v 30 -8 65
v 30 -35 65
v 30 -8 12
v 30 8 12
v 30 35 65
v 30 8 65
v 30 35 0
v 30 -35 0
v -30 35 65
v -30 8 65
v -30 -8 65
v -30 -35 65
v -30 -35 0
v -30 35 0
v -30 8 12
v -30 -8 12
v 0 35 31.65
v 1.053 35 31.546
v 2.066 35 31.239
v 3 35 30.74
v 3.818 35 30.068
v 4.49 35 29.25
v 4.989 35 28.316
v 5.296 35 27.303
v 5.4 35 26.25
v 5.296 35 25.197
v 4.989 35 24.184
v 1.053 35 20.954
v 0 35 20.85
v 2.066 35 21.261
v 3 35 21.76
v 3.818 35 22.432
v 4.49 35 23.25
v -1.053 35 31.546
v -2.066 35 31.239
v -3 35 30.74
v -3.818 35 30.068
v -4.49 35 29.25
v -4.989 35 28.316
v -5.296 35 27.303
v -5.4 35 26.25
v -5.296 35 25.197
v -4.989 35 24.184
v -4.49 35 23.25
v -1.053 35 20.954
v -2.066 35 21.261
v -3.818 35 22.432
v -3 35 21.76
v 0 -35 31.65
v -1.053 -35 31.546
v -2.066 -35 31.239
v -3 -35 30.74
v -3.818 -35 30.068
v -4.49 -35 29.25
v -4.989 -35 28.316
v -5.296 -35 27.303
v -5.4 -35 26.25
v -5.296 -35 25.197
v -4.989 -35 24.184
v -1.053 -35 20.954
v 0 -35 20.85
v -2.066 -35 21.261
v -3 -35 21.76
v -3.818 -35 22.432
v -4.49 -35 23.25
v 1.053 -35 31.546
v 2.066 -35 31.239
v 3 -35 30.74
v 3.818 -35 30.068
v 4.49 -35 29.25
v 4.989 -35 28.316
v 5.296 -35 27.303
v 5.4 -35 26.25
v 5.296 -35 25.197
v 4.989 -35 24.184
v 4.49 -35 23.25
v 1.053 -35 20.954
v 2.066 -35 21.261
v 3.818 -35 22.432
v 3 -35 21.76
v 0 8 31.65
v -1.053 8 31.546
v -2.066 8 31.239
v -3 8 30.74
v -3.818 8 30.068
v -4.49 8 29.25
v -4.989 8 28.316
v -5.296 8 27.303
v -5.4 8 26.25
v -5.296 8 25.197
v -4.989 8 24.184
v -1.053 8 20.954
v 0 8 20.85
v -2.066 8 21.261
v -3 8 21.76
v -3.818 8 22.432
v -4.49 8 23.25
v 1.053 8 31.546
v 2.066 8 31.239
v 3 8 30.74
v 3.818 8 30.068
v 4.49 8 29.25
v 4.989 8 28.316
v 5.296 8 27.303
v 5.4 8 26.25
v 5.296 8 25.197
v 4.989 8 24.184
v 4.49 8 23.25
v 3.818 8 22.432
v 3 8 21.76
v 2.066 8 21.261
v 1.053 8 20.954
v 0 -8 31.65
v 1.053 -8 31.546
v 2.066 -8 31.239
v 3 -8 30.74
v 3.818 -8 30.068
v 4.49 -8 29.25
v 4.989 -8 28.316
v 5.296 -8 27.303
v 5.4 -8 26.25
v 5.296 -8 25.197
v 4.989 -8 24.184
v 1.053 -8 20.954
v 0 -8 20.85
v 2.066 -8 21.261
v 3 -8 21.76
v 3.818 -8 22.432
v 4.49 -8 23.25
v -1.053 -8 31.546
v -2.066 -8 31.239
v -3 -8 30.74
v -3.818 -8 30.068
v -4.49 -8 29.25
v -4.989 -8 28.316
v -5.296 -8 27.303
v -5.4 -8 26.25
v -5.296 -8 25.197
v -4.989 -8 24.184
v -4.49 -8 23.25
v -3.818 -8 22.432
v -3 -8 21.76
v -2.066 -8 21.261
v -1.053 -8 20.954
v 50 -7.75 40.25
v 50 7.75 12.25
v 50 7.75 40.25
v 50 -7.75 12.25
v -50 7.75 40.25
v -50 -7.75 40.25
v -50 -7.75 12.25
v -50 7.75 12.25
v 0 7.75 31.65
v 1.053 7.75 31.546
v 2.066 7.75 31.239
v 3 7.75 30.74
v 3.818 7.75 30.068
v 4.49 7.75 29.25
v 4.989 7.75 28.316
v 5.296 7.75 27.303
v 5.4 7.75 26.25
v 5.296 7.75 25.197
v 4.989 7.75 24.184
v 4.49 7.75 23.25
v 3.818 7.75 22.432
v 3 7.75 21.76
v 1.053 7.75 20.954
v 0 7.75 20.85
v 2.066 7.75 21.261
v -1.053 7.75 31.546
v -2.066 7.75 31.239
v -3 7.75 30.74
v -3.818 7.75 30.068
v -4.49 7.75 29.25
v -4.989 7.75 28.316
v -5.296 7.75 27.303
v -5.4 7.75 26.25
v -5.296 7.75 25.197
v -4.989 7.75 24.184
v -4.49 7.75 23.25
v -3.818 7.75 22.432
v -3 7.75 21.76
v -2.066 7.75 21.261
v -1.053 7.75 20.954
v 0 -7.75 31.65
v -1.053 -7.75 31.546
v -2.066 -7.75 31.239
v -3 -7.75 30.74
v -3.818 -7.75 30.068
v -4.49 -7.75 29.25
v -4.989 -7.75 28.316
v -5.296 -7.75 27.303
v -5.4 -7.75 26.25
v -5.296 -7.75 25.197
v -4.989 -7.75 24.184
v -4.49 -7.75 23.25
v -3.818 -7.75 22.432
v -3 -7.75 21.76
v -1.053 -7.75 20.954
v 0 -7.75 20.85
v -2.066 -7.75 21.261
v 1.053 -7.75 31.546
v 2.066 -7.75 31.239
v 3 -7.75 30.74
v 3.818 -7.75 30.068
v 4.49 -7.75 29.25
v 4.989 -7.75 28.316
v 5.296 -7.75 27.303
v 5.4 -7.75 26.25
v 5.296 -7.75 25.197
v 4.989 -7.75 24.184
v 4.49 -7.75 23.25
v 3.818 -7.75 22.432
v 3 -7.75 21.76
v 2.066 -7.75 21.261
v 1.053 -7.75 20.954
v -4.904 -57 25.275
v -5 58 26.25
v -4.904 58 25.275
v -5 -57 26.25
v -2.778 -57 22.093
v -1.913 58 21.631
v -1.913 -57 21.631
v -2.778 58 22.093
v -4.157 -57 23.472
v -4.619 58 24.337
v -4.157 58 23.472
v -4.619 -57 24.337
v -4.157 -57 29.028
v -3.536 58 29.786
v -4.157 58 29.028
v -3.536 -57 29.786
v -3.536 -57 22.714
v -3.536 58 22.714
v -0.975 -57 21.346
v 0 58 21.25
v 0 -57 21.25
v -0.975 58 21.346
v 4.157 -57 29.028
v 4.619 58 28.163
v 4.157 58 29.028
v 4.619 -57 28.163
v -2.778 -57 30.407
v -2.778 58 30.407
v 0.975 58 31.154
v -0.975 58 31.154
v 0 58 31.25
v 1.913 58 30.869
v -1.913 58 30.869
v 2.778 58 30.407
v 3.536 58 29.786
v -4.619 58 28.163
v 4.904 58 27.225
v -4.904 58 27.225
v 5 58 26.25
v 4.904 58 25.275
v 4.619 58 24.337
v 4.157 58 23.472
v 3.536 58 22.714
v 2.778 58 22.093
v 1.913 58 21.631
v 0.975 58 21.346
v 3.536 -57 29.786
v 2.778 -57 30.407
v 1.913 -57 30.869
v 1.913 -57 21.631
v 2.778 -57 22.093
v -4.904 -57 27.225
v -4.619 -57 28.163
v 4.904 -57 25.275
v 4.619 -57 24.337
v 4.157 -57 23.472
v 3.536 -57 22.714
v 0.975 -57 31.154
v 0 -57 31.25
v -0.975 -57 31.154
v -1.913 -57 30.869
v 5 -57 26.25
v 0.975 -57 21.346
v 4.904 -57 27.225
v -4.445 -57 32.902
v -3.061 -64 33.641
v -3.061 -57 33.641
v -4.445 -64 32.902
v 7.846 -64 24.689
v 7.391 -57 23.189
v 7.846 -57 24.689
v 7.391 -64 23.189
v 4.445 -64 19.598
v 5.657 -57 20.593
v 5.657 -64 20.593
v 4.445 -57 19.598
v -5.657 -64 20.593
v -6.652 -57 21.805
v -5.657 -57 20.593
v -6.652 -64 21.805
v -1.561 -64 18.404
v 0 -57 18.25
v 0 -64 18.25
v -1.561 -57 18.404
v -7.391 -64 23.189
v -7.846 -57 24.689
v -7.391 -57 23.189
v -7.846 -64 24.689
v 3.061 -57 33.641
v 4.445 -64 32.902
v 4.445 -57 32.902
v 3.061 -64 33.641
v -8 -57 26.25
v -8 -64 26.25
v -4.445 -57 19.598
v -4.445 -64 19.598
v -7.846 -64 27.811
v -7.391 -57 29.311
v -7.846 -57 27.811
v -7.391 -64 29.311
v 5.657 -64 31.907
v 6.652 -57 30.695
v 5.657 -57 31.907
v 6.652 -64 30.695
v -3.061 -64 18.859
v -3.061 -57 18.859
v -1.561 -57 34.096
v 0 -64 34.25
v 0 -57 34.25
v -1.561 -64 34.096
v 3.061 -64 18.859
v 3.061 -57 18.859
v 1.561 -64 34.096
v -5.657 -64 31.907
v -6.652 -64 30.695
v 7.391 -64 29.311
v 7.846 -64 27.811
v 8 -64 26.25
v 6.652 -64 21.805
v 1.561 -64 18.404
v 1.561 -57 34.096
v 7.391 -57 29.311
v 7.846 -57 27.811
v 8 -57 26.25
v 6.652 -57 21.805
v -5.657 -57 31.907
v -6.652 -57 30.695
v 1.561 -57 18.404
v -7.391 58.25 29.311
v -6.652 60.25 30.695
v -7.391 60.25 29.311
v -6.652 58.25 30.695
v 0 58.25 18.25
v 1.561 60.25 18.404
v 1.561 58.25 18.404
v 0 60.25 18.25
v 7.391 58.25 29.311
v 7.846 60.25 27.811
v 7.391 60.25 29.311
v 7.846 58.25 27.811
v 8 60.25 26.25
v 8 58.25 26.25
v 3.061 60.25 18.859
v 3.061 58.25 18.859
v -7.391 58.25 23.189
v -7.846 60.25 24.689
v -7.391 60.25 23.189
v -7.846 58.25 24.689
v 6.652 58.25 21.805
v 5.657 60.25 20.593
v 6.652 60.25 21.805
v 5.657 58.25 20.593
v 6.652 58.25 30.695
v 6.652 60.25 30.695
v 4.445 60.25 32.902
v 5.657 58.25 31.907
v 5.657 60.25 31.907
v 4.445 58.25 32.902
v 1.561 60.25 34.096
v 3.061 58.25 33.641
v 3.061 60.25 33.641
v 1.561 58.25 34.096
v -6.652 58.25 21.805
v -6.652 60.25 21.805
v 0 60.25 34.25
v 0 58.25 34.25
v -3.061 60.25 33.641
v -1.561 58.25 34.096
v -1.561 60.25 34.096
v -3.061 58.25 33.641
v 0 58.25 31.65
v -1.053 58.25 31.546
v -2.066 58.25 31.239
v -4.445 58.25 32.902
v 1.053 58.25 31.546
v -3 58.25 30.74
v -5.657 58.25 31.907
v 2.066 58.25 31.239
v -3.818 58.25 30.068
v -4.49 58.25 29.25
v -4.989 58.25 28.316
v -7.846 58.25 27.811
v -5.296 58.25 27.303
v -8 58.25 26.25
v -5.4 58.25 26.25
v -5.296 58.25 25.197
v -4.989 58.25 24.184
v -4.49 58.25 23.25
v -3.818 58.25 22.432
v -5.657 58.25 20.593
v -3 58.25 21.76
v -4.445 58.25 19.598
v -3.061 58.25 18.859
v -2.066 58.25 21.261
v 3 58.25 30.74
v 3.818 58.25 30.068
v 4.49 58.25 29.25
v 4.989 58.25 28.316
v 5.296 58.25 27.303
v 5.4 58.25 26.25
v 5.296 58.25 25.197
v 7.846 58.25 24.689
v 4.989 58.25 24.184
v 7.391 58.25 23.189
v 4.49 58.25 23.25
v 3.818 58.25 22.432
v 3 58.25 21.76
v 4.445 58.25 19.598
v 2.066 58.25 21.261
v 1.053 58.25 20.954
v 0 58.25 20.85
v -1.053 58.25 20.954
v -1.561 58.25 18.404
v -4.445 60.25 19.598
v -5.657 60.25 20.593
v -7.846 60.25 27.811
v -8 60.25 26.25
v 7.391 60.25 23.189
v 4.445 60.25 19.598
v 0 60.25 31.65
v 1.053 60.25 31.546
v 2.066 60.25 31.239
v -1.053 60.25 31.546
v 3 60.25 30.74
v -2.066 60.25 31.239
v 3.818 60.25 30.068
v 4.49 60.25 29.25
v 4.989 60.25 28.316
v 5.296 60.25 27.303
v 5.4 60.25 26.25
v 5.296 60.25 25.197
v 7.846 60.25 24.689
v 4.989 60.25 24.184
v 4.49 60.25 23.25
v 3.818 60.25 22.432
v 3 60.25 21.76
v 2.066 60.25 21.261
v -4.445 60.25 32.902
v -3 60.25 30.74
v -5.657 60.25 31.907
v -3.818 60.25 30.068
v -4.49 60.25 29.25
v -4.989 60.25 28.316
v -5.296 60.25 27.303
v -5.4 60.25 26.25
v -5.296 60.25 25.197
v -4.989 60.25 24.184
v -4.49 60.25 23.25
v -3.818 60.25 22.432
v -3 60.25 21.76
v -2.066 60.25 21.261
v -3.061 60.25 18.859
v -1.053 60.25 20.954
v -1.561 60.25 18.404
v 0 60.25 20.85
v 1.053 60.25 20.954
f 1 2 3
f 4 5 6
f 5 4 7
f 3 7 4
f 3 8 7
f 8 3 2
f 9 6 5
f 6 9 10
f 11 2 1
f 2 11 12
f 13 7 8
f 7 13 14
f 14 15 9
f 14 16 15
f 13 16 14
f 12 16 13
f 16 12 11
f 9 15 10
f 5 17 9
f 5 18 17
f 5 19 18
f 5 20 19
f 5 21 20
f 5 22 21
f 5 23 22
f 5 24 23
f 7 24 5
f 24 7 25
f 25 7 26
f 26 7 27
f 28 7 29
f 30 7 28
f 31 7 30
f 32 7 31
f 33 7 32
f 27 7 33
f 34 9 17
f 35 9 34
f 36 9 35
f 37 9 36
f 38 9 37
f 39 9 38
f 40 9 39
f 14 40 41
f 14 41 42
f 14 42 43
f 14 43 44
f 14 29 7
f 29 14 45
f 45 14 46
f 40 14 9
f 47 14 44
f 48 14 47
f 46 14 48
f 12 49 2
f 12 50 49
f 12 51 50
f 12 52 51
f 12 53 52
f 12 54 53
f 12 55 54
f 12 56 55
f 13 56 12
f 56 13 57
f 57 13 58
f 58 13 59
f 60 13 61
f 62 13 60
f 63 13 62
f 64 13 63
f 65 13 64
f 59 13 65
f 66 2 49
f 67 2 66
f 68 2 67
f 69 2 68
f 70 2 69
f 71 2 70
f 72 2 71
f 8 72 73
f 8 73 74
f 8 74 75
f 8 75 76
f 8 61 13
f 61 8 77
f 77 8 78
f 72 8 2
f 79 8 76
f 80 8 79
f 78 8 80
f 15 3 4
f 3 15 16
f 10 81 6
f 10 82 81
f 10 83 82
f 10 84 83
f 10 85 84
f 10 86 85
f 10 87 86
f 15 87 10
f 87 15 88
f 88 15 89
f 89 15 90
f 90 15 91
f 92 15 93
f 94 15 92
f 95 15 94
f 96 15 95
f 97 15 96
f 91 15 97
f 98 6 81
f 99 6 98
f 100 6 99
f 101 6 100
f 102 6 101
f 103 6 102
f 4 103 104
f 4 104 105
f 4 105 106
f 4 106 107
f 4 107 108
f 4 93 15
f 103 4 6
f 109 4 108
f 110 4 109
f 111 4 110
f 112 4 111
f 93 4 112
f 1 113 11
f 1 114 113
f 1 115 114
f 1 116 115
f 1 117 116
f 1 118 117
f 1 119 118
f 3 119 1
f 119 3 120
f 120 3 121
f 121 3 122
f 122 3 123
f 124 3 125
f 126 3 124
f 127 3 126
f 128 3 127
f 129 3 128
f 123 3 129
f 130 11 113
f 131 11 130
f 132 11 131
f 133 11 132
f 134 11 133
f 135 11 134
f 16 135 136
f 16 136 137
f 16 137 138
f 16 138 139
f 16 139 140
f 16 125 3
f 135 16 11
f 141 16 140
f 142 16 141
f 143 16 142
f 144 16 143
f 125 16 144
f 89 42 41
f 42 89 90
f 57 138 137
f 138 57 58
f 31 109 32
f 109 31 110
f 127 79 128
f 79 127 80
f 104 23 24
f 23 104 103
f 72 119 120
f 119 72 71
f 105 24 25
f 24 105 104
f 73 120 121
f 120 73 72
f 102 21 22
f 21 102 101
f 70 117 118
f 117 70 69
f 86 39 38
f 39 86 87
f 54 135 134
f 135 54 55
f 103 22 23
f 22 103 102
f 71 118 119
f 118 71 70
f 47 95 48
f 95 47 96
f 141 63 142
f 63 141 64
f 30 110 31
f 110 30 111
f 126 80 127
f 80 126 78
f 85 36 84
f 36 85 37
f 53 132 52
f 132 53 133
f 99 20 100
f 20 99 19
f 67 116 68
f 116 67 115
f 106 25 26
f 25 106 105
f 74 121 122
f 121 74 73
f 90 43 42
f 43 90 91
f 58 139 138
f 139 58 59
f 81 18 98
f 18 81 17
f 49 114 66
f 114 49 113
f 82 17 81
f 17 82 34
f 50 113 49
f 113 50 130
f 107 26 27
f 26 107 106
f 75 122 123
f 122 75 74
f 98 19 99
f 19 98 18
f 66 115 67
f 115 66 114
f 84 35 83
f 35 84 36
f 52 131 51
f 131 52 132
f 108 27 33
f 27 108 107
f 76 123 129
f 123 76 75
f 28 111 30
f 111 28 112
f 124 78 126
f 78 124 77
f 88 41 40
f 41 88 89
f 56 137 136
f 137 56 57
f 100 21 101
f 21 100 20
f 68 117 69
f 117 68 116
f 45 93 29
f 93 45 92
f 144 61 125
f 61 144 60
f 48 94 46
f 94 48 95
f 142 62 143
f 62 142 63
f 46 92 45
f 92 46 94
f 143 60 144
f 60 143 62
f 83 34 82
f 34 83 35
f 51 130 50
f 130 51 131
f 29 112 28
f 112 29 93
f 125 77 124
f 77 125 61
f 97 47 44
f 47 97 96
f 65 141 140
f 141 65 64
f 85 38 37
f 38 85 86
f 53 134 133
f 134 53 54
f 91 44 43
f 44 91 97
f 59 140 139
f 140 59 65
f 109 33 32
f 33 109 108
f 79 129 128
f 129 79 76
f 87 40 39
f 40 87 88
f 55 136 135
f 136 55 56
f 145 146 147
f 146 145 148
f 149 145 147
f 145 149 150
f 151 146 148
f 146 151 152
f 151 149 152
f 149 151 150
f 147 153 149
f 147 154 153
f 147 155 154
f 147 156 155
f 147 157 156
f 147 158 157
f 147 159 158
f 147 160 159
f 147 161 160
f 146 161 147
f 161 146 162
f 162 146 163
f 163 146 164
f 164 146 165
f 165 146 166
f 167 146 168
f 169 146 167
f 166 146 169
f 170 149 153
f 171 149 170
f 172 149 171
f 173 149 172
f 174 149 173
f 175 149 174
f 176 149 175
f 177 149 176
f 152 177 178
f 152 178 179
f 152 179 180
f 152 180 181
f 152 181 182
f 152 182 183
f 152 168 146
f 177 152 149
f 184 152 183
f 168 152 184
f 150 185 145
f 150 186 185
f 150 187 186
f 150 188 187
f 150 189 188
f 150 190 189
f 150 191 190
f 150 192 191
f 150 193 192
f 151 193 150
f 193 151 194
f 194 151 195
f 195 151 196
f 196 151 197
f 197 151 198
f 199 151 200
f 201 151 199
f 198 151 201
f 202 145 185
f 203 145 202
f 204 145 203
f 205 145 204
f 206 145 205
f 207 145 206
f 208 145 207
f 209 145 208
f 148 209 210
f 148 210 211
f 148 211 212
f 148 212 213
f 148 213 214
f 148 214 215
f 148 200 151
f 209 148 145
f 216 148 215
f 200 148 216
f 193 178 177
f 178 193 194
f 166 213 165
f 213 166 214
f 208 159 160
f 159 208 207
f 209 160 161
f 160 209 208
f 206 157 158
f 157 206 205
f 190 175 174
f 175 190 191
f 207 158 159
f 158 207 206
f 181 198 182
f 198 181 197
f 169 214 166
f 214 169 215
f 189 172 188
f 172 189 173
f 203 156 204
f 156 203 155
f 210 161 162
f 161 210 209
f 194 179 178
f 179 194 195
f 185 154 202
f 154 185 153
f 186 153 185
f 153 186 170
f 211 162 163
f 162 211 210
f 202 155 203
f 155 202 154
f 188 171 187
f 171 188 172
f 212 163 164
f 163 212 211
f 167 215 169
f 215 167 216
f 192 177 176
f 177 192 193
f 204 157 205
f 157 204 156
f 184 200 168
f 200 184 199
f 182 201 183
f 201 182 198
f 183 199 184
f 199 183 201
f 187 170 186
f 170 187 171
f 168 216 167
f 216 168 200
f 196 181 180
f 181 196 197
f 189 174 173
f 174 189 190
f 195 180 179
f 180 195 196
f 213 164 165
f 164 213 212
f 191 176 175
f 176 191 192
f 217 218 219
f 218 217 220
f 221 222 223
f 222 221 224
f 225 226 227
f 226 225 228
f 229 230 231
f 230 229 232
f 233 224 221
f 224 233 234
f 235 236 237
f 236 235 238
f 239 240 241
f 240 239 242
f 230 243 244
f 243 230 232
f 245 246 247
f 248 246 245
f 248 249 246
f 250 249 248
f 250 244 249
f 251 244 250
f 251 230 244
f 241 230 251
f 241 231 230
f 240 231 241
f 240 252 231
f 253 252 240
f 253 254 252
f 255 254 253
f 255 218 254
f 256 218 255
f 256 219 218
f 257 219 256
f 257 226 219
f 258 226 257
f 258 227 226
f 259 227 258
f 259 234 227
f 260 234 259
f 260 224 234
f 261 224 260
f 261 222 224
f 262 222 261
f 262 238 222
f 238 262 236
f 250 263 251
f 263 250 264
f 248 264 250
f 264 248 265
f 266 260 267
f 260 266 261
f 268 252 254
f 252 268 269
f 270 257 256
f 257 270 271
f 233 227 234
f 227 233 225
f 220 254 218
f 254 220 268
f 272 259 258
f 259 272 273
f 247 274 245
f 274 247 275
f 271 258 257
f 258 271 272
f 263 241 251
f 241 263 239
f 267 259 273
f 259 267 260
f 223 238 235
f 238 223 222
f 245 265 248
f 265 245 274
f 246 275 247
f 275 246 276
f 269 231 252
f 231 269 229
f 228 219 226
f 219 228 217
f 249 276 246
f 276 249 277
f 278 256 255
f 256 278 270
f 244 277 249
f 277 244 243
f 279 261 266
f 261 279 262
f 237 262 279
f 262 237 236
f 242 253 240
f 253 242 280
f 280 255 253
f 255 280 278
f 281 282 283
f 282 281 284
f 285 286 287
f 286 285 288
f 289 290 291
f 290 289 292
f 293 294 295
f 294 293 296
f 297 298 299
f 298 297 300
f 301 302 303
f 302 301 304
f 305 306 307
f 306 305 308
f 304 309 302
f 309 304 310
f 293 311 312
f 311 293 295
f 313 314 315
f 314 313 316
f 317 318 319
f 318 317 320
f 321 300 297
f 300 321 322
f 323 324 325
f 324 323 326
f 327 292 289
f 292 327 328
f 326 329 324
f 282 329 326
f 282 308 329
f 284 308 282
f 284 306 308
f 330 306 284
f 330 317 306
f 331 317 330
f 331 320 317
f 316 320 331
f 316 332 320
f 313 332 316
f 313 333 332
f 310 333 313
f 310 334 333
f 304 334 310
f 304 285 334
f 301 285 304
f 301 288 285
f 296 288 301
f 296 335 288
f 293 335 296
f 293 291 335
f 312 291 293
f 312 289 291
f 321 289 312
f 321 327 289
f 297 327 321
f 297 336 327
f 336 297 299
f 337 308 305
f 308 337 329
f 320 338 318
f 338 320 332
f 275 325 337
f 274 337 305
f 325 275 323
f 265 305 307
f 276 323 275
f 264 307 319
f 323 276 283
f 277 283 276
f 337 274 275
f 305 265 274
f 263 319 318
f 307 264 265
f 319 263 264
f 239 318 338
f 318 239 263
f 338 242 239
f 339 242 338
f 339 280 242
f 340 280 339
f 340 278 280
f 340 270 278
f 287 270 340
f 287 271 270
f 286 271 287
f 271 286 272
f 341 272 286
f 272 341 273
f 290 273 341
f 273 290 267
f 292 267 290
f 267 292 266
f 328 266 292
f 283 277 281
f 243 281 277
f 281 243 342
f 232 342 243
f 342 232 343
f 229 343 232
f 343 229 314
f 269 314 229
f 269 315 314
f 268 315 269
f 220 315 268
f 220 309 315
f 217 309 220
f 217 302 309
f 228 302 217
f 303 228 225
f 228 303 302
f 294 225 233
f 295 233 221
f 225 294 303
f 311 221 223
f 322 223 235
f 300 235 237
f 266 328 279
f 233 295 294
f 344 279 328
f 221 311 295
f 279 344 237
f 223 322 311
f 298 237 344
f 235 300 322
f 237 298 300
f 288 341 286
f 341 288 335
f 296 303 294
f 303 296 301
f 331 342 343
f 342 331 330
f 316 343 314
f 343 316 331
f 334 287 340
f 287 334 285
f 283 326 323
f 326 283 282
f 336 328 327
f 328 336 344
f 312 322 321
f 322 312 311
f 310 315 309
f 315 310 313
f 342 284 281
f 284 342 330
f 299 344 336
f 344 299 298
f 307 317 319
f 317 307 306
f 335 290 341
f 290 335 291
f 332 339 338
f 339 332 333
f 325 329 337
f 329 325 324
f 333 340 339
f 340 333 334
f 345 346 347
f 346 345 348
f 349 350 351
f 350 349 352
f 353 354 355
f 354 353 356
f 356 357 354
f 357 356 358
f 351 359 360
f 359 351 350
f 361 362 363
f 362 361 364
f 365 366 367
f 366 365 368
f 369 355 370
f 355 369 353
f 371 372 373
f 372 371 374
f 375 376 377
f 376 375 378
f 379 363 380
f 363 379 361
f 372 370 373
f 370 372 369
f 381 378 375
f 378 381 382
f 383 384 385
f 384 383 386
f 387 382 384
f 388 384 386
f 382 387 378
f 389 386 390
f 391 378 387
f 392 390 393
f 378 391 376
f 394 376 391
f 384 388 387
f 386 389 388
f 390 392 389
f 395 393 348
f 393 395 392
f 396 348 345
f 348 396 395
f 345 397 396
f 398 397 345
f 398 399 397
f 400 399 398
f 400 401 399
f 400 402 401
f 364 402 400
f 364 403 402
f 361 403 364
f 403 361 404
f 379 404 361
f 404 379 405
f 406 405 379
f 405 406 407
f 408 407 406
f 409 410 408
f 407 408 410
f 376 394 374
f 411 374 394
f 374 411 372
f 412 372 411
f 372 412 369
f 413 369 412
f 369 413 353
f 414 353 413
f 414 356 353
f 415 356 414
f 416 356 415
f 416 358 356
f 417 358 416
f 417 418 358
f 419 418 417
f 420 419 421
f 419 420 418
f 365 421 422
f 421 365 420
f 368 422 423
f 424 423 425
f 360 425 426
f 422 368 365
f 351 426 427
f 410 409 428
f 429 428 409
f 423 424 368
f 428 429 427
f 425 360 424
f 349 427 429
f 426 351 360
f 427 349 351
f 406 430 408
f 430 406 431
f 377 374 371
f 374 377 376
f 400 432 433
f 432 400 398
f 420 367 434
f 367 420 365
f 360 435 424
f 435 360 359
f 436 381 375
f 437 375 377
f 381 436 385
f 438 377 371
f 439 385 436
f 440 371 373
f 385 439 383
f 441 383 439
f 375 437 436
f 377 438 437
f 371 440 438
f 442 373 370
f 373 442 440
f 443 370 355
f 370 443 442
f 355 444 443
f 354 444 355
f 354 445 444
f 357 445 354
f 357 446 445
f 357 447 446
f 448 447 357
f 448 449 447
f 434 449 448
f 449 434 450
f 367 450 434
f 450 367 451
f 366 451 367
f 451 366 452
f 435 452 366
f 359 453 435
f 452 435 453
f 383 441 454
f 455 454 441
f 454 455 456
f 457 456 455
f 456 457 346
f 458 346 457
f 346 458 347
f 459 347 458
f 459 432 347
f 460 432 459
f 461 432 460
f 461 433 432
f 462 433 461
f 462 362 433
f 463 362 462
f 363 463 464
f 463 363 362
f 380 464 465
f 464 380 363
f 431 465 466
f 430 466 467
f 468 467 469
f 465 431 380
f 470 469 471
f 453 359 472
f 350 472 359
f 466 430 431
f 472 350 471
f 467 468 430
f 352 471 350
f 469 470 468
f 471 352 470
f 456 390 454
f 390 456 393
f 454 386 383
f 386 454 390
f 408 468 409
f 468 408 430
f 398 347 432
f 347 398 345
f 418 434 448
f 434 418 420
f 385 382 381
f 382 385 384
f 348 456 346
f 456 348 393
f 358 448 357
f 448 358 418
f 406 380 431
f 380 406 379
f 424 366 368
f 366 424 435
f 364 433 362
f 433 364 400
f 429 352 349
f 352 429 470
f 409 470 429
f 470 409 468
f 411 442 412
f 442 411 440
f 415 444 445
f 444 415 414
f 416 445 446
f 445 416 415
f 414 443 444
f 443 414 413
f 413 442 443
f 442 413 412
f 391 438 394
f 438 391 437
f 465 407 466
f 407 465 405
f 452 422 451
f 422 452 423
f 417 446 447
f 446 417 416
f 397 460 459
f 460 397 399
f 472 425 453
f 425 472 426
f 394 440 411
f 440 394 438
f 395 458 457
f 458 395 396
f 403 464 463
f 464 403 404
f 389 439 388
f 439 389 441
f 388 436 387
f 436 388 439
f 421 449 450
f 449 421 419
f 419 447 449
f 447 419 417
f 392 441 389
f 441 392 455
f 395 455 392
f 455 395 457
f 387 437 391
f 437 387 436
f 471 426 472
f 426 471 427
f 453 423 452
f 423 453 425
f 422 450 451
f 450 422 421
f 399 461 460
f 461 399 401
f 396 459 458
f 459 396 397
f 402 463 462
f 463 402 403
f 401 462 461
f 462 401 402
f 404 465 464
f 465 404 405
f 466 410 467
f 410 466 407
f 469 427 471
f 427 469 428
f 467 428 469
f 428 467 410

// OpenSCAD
$fn = 32;

// ------------------------------------------------------------------------
// Clevis joint: 60 mm clevis, pin d10
// Every part is its own module, assembly() places them once.
// ------------------------------------------------------------------------

// --- part 1 ---
module clevis() {
  difference() {
    translate([-30, -35, 0]) cube([60, 70, 65]);
    translate([-31, -8, 12]) cube([62, 16, 54]);
    translate([0, 0, 26.25]) rotate([90, 0, 0]) cylinder(h = 72, d = 10.8, center = true);
  }
}

// --- part 2 ---
module eye() {
  difference() {
    translate([-50, -7.75, 0]) cube([100, 15.5, 28]);
    translate([0, 0, 14]) rotate([90, 0, 0]) cylinder(h = 17.5, d = 10.8, center = true);
  }
}

// --- part 3 ---
module pin() {
  rotate([0, 90, 0]) cylinder(h = 116, d = 10, center = true);
  translate([-64, 0, 0]) rotate([0, 90, 0]) cylinder(h = 7, d = 16);
}

// --- part 4 ---
module retainer() {
  difference() {
      translate([0, 0, 0]) cylinder(h = 2, d = 16);
      translate([0, 0, -1]) cylinder(h = 4, d = 10.8);
    }
}

// --- assembly ---
module assembly() {
  translate([0, 0, 0]) rotate([0, 0, 0]) clevis();
  translate([0, 0, 12.25]) rotate([0, 0, 0]) eye();
  translate([0, 0, 26.25]) rotate([0, 0, 90]) pin();
  translate([0, 60.25, 26.25]) rotate([90, 0, 0]) retainer();
}

assembly();
